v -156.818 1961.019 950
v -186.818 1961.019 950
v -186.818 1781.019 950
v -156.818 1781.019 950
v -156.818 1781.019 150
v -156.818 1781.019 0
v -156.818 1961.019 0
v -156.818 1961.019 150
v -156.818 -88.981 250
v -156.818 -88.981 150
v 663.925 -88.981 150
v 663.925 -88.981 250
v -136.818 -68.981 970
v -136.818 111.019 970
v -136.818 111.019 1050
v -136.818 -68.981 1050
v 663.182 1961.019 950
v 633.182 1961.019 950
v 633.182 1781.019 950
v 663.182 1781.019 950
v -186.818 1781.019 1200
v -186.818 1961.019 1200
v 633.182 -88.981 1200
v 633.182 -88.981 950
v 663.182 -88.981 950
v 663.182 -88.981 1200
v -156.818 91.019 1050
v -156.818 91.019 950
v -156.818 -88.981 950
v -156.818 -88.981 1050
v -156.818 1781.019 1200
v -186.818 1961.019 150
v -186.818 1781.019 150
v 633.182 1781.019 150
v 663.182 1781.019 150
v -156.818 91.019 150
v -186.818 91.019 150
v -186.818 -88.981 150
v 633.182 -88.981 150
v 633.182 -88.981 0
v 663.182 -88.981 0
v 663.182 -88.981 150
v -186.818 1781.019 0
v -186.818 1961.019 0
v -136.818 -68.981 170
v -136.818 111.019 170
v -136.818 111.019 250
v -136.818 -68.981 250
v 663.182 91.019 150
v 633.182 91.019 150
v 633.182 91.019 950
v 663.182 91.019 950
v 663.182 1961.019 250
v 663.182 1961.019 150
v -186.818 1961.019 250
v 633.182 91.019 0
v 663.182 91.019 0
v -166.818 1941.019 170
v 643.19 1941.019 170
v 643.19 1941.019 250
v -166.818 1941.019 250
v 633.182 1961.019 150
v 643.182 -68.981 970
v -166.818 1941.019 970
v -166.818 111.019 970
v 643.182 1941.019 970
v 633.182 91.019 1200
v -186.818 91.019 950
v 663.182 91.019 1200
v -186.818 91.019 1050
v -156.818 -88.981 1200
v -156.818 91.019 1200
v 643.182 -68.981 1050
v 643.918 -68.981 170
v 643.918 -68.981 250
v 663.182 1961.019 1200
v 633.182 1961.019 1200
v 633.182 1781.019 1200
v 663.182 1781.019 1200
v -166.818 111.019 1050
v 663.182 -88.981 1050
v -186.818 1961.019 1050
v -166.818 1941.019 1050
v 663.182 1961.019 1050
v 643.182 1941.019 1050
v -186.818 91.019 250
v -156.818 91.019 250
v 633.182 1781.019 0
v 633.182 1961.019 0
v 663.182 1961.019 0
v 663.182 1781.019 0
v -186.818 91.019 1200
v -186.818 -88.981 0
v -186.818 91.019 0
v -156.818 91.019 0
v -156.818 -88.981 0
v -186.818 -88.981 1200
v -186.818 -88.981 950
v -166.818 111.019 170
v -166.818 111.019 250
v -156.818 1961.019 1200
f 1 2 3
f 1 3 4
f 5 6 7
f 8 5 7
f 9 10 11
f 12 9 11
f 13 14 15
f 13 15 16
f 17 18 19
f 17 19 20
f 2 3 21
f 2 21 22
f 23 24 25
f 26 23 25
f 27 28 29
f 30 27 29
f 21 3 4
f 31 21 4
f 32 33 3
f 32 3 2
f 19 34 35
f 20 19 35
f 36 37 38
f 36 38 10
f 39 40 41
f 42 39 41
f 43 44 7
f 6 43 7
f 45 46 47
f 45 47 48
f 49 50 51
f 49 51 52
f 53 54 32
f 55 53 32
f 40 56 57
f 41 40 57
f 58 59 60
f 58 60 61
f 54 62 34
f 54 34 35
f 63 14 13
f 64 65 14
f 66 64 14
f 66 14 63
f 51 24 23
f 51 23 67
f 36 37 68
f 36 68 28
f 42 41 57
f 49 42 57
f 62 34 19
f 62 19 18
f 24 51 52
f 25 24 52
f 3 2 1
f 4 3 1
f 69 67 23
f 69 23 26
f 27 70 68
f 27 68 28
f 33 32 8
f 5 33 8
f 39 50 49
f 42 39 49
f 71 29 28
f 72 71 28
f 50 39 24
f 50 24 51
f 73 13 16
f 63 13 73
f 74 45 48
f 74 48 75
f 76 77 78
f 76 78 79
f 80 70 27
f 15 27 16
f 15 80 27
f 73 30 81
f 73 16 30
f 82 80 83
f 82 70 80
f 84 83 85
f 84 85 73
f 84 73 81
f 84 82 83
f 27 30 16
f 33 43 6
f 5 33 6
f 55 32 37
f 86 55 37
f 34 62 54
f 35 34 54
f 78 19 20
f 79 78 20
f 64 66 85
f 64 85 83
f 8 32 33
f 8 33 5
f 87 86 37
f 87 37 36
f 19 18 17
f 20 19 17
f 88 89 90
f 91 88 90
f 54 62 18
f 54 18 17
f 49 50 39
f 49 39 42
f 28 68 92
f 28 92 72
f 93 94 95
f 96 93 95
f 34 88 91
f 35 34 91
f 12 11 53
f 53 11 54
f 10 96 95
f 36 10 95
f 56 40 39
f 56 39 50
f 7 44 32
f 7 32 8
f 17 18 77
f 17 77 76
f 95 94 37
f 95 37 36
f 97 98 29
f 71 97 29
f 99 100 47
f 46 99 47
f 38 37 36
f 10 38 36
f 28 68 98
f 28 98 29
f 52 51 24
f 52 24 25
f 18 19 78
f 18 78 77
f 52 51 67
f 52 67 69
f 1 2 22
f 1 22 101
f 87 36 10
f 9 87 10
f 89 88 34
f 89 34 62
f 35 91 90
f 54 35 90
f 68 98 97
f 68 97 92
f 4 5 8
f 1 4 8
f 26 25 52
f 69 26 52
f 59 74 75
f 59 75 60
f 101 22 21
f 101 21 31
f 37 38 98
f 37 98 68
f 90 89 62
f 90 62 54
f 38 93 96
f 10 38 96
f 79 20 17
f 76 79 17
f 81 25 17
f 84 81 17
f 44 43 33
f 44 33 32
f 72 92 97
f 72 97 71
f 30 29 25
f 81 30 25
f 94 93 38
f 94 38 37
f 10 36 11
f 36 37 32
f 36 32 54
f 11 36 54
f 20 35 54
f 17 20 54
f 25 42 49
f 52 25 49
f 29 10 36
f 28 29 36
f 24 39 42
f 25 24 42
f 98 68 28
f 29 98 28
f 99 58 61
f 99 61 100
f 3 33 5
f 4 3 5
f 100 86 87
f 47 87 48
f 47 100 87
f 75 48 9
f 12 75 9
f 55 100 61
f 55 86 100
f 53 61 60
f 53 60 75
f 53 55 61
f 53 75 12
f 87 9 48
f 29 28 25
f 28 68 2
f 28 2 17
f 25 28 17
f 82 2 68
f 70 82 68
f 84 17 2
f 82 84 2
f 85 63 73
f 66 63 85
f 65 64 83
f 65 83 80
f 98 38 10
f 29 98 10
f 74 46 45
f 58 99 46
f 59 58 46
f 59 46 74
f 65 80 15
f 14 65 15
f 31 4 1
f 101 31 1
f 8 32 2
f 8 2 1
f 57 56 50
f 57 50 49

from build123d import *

# Parameters (mm, degrees)
F0_W     = 30
F0_H     = 180
F1_DEPTH = 150
F3_DEPTH = 100
F4_DEPTH = 800
F5_T     = -20
F7_DEPTH = 250
F8_DEPTH = 100
F9_T     = -20


with BuildPart() as f1:
    # F0 (on Top) → F1 (new body)
    with BuildSketch(Plane.XY):
        with Locations((-171.817610931, 1871.0189068435)):
            Rectangle(F0_W, F0_H)
    extrude(amount=F1_DEPTH)


with BuildPart() as f1b:
    # F0 (on Top) → F1, piece 2 (new body)
    with BuildSketch(Plane.XY):
        with Locations((648.182389069, 1871.0189068435)):
            Rectangle(F0_W, F0_H)
    extrude(amount=F1_DEPTH)


with BuildPart() as f1c:
    # F0 (on Top) → F1, piece 3 (new body)
    with BuildSketch(Plane.XY):
        with Locations((-171.817610931, 1.0189068435)):
            Rectangle(F0_W, F0_H)
    extrude(amount=F1_DEPTH)


with BuildPart() as f1d:
    # F0 (on Top) → F1, piece 4 (new body)
    with BuildSketch(Plane.XY):
        with Locations((648.182389069, 1.0189068435)):
            Rectangle(F0_W, F0_H)
    extrude(amount=F1_DEPTH)


with BuildPart() as f3:
    # F2 (on face) → F3 (new body)
    with BuildSketch(Plane.XY.offset(150)):
        Polygon((-156.817610931, 91.0189068435), (-156.817610931, -88.9810931565), (663.9247536659, -88.9810931565), (663.182389069, 1961.0189068435), (-186.817610931, 1961.0189068435), (-186.817610931, 91.0189068435), align=None)
    extrude(amount=F3_DEPTH)

    # F5
    f5_openings = [f3.faces().sort_by_distance(p)[0] for p in [
        (239.642564, 938.774604, 250),
    ]]
    offset(amount=F5_T, openings=f5_openings, kind=Kind.INTERSECTION)


with BuildPart() as f4:
    # F4 (new): a face of the model
    f4_faces = [f1b.part.faces().sort_by_distance(p)[0] for p in [
        (648.182389069, 1871.0189068435, 150),
    ]]
    extrude(f4_faces, amount=F4_DEPTH)


with BuildPart() as f4b:
    # F4#2 (new): a face of the model
    f4_2_faces = [f1.part.faces().sort_by_distance(p)[0] for p in [
        (-171.817610931, 1871.0189068435, 150),
    ]]
    extrude(f4_2_faces, amount=F4_DEPTH)


with BuildPart() as f4c:
    # F4#3 (new): a face of the model
    f4_3_faces = [f1d.part.faces().sort_by_distance(p)[0] for p in [
        (648.182389069, 1.0189068435, 150),
    ]]
    extrude(f4_3_faces, amount=F4_DEPTH)


with BuildPart() as f4d:
    # F4#4 (new): a face of the model
    f4_4_faces = [f1c.part.faces().sort_by_distance(p)[0] for p in [
        (-171.817610931, 1.0189068435, 150),
    ]]
    extrude(f4_4_faces, amount=F4_DEPTH)


with BuildPart() as f7:
    # F7 (new): a face of the model
    f7_faces = [f4c.part.faces().sort_by_distance(p)[0] for p in [
        (648.182389069, 1.0189068435, 950),
    ]]
    extrude(f7_faces, amount=F7_DEPTH)


with BuildPart() as f7b:
    # F7#2 (new): a face of the model
    f7_2_faces = [f4d.part.faces().sort_by_distance(p)[0] for p in [
        (-171.817610931, 1.0189068435, 950),
    ]]
    extrude(f7_2_faces, amount=F7_DEPTH)


with BuildPart() as f7c:
    # F7#3 (new): a face of the model
    f7_3_faces = [f4b.part.faces().sort_by_distance(p)[0] for p in [
        (-171.817610931, 1871.0189068435, 950),
    ]]
    extrude(f7_3_faces, amount=F7_DEPTH)


with BuildPart() as f7d:
    # F7#4 (new): a face of the model
    f7_4_faces = [f4.part.faces().sort_by_distance(p)[0] for p in [
        (648.182389069, 1871.0189068435, 950),
    ]]
    extrude(f7_4_faces, amount=F7_DEPTH)


with BuildPart() as f8:
    # F6 (on face) → F8 (new body)
    with BuildSketch(Plane.XY.offset(950)):
        Polygon((-156.817610931, 91.0189068435), (-156.817610931, -88.9810931565), (663.182389069, -88.9810931565), (663.182389069, 1961.0189068435), (-186.817610931, 1961.0189068435), (-186.817610931, 91.0189068435), align=None)
    extrude(amount=F8_DEPTH)

    # F9
    f9_openings = [f8.faces().sort_by_distance(p)[0] for p in [
        (239.456927, 938.925475, 1050),
    ]]
    offset(amount=F9_T, openings=f9_openings, kind=Kind.INTERSECTION)


solid = Compound([f1.part, f1b.part, f1c.part, f1d.part, f3.part, f4.part, f4b.part, f4c.part, f4d.part, f7.part, f7b.part, f7c.part, f7d.part, f8.part])
